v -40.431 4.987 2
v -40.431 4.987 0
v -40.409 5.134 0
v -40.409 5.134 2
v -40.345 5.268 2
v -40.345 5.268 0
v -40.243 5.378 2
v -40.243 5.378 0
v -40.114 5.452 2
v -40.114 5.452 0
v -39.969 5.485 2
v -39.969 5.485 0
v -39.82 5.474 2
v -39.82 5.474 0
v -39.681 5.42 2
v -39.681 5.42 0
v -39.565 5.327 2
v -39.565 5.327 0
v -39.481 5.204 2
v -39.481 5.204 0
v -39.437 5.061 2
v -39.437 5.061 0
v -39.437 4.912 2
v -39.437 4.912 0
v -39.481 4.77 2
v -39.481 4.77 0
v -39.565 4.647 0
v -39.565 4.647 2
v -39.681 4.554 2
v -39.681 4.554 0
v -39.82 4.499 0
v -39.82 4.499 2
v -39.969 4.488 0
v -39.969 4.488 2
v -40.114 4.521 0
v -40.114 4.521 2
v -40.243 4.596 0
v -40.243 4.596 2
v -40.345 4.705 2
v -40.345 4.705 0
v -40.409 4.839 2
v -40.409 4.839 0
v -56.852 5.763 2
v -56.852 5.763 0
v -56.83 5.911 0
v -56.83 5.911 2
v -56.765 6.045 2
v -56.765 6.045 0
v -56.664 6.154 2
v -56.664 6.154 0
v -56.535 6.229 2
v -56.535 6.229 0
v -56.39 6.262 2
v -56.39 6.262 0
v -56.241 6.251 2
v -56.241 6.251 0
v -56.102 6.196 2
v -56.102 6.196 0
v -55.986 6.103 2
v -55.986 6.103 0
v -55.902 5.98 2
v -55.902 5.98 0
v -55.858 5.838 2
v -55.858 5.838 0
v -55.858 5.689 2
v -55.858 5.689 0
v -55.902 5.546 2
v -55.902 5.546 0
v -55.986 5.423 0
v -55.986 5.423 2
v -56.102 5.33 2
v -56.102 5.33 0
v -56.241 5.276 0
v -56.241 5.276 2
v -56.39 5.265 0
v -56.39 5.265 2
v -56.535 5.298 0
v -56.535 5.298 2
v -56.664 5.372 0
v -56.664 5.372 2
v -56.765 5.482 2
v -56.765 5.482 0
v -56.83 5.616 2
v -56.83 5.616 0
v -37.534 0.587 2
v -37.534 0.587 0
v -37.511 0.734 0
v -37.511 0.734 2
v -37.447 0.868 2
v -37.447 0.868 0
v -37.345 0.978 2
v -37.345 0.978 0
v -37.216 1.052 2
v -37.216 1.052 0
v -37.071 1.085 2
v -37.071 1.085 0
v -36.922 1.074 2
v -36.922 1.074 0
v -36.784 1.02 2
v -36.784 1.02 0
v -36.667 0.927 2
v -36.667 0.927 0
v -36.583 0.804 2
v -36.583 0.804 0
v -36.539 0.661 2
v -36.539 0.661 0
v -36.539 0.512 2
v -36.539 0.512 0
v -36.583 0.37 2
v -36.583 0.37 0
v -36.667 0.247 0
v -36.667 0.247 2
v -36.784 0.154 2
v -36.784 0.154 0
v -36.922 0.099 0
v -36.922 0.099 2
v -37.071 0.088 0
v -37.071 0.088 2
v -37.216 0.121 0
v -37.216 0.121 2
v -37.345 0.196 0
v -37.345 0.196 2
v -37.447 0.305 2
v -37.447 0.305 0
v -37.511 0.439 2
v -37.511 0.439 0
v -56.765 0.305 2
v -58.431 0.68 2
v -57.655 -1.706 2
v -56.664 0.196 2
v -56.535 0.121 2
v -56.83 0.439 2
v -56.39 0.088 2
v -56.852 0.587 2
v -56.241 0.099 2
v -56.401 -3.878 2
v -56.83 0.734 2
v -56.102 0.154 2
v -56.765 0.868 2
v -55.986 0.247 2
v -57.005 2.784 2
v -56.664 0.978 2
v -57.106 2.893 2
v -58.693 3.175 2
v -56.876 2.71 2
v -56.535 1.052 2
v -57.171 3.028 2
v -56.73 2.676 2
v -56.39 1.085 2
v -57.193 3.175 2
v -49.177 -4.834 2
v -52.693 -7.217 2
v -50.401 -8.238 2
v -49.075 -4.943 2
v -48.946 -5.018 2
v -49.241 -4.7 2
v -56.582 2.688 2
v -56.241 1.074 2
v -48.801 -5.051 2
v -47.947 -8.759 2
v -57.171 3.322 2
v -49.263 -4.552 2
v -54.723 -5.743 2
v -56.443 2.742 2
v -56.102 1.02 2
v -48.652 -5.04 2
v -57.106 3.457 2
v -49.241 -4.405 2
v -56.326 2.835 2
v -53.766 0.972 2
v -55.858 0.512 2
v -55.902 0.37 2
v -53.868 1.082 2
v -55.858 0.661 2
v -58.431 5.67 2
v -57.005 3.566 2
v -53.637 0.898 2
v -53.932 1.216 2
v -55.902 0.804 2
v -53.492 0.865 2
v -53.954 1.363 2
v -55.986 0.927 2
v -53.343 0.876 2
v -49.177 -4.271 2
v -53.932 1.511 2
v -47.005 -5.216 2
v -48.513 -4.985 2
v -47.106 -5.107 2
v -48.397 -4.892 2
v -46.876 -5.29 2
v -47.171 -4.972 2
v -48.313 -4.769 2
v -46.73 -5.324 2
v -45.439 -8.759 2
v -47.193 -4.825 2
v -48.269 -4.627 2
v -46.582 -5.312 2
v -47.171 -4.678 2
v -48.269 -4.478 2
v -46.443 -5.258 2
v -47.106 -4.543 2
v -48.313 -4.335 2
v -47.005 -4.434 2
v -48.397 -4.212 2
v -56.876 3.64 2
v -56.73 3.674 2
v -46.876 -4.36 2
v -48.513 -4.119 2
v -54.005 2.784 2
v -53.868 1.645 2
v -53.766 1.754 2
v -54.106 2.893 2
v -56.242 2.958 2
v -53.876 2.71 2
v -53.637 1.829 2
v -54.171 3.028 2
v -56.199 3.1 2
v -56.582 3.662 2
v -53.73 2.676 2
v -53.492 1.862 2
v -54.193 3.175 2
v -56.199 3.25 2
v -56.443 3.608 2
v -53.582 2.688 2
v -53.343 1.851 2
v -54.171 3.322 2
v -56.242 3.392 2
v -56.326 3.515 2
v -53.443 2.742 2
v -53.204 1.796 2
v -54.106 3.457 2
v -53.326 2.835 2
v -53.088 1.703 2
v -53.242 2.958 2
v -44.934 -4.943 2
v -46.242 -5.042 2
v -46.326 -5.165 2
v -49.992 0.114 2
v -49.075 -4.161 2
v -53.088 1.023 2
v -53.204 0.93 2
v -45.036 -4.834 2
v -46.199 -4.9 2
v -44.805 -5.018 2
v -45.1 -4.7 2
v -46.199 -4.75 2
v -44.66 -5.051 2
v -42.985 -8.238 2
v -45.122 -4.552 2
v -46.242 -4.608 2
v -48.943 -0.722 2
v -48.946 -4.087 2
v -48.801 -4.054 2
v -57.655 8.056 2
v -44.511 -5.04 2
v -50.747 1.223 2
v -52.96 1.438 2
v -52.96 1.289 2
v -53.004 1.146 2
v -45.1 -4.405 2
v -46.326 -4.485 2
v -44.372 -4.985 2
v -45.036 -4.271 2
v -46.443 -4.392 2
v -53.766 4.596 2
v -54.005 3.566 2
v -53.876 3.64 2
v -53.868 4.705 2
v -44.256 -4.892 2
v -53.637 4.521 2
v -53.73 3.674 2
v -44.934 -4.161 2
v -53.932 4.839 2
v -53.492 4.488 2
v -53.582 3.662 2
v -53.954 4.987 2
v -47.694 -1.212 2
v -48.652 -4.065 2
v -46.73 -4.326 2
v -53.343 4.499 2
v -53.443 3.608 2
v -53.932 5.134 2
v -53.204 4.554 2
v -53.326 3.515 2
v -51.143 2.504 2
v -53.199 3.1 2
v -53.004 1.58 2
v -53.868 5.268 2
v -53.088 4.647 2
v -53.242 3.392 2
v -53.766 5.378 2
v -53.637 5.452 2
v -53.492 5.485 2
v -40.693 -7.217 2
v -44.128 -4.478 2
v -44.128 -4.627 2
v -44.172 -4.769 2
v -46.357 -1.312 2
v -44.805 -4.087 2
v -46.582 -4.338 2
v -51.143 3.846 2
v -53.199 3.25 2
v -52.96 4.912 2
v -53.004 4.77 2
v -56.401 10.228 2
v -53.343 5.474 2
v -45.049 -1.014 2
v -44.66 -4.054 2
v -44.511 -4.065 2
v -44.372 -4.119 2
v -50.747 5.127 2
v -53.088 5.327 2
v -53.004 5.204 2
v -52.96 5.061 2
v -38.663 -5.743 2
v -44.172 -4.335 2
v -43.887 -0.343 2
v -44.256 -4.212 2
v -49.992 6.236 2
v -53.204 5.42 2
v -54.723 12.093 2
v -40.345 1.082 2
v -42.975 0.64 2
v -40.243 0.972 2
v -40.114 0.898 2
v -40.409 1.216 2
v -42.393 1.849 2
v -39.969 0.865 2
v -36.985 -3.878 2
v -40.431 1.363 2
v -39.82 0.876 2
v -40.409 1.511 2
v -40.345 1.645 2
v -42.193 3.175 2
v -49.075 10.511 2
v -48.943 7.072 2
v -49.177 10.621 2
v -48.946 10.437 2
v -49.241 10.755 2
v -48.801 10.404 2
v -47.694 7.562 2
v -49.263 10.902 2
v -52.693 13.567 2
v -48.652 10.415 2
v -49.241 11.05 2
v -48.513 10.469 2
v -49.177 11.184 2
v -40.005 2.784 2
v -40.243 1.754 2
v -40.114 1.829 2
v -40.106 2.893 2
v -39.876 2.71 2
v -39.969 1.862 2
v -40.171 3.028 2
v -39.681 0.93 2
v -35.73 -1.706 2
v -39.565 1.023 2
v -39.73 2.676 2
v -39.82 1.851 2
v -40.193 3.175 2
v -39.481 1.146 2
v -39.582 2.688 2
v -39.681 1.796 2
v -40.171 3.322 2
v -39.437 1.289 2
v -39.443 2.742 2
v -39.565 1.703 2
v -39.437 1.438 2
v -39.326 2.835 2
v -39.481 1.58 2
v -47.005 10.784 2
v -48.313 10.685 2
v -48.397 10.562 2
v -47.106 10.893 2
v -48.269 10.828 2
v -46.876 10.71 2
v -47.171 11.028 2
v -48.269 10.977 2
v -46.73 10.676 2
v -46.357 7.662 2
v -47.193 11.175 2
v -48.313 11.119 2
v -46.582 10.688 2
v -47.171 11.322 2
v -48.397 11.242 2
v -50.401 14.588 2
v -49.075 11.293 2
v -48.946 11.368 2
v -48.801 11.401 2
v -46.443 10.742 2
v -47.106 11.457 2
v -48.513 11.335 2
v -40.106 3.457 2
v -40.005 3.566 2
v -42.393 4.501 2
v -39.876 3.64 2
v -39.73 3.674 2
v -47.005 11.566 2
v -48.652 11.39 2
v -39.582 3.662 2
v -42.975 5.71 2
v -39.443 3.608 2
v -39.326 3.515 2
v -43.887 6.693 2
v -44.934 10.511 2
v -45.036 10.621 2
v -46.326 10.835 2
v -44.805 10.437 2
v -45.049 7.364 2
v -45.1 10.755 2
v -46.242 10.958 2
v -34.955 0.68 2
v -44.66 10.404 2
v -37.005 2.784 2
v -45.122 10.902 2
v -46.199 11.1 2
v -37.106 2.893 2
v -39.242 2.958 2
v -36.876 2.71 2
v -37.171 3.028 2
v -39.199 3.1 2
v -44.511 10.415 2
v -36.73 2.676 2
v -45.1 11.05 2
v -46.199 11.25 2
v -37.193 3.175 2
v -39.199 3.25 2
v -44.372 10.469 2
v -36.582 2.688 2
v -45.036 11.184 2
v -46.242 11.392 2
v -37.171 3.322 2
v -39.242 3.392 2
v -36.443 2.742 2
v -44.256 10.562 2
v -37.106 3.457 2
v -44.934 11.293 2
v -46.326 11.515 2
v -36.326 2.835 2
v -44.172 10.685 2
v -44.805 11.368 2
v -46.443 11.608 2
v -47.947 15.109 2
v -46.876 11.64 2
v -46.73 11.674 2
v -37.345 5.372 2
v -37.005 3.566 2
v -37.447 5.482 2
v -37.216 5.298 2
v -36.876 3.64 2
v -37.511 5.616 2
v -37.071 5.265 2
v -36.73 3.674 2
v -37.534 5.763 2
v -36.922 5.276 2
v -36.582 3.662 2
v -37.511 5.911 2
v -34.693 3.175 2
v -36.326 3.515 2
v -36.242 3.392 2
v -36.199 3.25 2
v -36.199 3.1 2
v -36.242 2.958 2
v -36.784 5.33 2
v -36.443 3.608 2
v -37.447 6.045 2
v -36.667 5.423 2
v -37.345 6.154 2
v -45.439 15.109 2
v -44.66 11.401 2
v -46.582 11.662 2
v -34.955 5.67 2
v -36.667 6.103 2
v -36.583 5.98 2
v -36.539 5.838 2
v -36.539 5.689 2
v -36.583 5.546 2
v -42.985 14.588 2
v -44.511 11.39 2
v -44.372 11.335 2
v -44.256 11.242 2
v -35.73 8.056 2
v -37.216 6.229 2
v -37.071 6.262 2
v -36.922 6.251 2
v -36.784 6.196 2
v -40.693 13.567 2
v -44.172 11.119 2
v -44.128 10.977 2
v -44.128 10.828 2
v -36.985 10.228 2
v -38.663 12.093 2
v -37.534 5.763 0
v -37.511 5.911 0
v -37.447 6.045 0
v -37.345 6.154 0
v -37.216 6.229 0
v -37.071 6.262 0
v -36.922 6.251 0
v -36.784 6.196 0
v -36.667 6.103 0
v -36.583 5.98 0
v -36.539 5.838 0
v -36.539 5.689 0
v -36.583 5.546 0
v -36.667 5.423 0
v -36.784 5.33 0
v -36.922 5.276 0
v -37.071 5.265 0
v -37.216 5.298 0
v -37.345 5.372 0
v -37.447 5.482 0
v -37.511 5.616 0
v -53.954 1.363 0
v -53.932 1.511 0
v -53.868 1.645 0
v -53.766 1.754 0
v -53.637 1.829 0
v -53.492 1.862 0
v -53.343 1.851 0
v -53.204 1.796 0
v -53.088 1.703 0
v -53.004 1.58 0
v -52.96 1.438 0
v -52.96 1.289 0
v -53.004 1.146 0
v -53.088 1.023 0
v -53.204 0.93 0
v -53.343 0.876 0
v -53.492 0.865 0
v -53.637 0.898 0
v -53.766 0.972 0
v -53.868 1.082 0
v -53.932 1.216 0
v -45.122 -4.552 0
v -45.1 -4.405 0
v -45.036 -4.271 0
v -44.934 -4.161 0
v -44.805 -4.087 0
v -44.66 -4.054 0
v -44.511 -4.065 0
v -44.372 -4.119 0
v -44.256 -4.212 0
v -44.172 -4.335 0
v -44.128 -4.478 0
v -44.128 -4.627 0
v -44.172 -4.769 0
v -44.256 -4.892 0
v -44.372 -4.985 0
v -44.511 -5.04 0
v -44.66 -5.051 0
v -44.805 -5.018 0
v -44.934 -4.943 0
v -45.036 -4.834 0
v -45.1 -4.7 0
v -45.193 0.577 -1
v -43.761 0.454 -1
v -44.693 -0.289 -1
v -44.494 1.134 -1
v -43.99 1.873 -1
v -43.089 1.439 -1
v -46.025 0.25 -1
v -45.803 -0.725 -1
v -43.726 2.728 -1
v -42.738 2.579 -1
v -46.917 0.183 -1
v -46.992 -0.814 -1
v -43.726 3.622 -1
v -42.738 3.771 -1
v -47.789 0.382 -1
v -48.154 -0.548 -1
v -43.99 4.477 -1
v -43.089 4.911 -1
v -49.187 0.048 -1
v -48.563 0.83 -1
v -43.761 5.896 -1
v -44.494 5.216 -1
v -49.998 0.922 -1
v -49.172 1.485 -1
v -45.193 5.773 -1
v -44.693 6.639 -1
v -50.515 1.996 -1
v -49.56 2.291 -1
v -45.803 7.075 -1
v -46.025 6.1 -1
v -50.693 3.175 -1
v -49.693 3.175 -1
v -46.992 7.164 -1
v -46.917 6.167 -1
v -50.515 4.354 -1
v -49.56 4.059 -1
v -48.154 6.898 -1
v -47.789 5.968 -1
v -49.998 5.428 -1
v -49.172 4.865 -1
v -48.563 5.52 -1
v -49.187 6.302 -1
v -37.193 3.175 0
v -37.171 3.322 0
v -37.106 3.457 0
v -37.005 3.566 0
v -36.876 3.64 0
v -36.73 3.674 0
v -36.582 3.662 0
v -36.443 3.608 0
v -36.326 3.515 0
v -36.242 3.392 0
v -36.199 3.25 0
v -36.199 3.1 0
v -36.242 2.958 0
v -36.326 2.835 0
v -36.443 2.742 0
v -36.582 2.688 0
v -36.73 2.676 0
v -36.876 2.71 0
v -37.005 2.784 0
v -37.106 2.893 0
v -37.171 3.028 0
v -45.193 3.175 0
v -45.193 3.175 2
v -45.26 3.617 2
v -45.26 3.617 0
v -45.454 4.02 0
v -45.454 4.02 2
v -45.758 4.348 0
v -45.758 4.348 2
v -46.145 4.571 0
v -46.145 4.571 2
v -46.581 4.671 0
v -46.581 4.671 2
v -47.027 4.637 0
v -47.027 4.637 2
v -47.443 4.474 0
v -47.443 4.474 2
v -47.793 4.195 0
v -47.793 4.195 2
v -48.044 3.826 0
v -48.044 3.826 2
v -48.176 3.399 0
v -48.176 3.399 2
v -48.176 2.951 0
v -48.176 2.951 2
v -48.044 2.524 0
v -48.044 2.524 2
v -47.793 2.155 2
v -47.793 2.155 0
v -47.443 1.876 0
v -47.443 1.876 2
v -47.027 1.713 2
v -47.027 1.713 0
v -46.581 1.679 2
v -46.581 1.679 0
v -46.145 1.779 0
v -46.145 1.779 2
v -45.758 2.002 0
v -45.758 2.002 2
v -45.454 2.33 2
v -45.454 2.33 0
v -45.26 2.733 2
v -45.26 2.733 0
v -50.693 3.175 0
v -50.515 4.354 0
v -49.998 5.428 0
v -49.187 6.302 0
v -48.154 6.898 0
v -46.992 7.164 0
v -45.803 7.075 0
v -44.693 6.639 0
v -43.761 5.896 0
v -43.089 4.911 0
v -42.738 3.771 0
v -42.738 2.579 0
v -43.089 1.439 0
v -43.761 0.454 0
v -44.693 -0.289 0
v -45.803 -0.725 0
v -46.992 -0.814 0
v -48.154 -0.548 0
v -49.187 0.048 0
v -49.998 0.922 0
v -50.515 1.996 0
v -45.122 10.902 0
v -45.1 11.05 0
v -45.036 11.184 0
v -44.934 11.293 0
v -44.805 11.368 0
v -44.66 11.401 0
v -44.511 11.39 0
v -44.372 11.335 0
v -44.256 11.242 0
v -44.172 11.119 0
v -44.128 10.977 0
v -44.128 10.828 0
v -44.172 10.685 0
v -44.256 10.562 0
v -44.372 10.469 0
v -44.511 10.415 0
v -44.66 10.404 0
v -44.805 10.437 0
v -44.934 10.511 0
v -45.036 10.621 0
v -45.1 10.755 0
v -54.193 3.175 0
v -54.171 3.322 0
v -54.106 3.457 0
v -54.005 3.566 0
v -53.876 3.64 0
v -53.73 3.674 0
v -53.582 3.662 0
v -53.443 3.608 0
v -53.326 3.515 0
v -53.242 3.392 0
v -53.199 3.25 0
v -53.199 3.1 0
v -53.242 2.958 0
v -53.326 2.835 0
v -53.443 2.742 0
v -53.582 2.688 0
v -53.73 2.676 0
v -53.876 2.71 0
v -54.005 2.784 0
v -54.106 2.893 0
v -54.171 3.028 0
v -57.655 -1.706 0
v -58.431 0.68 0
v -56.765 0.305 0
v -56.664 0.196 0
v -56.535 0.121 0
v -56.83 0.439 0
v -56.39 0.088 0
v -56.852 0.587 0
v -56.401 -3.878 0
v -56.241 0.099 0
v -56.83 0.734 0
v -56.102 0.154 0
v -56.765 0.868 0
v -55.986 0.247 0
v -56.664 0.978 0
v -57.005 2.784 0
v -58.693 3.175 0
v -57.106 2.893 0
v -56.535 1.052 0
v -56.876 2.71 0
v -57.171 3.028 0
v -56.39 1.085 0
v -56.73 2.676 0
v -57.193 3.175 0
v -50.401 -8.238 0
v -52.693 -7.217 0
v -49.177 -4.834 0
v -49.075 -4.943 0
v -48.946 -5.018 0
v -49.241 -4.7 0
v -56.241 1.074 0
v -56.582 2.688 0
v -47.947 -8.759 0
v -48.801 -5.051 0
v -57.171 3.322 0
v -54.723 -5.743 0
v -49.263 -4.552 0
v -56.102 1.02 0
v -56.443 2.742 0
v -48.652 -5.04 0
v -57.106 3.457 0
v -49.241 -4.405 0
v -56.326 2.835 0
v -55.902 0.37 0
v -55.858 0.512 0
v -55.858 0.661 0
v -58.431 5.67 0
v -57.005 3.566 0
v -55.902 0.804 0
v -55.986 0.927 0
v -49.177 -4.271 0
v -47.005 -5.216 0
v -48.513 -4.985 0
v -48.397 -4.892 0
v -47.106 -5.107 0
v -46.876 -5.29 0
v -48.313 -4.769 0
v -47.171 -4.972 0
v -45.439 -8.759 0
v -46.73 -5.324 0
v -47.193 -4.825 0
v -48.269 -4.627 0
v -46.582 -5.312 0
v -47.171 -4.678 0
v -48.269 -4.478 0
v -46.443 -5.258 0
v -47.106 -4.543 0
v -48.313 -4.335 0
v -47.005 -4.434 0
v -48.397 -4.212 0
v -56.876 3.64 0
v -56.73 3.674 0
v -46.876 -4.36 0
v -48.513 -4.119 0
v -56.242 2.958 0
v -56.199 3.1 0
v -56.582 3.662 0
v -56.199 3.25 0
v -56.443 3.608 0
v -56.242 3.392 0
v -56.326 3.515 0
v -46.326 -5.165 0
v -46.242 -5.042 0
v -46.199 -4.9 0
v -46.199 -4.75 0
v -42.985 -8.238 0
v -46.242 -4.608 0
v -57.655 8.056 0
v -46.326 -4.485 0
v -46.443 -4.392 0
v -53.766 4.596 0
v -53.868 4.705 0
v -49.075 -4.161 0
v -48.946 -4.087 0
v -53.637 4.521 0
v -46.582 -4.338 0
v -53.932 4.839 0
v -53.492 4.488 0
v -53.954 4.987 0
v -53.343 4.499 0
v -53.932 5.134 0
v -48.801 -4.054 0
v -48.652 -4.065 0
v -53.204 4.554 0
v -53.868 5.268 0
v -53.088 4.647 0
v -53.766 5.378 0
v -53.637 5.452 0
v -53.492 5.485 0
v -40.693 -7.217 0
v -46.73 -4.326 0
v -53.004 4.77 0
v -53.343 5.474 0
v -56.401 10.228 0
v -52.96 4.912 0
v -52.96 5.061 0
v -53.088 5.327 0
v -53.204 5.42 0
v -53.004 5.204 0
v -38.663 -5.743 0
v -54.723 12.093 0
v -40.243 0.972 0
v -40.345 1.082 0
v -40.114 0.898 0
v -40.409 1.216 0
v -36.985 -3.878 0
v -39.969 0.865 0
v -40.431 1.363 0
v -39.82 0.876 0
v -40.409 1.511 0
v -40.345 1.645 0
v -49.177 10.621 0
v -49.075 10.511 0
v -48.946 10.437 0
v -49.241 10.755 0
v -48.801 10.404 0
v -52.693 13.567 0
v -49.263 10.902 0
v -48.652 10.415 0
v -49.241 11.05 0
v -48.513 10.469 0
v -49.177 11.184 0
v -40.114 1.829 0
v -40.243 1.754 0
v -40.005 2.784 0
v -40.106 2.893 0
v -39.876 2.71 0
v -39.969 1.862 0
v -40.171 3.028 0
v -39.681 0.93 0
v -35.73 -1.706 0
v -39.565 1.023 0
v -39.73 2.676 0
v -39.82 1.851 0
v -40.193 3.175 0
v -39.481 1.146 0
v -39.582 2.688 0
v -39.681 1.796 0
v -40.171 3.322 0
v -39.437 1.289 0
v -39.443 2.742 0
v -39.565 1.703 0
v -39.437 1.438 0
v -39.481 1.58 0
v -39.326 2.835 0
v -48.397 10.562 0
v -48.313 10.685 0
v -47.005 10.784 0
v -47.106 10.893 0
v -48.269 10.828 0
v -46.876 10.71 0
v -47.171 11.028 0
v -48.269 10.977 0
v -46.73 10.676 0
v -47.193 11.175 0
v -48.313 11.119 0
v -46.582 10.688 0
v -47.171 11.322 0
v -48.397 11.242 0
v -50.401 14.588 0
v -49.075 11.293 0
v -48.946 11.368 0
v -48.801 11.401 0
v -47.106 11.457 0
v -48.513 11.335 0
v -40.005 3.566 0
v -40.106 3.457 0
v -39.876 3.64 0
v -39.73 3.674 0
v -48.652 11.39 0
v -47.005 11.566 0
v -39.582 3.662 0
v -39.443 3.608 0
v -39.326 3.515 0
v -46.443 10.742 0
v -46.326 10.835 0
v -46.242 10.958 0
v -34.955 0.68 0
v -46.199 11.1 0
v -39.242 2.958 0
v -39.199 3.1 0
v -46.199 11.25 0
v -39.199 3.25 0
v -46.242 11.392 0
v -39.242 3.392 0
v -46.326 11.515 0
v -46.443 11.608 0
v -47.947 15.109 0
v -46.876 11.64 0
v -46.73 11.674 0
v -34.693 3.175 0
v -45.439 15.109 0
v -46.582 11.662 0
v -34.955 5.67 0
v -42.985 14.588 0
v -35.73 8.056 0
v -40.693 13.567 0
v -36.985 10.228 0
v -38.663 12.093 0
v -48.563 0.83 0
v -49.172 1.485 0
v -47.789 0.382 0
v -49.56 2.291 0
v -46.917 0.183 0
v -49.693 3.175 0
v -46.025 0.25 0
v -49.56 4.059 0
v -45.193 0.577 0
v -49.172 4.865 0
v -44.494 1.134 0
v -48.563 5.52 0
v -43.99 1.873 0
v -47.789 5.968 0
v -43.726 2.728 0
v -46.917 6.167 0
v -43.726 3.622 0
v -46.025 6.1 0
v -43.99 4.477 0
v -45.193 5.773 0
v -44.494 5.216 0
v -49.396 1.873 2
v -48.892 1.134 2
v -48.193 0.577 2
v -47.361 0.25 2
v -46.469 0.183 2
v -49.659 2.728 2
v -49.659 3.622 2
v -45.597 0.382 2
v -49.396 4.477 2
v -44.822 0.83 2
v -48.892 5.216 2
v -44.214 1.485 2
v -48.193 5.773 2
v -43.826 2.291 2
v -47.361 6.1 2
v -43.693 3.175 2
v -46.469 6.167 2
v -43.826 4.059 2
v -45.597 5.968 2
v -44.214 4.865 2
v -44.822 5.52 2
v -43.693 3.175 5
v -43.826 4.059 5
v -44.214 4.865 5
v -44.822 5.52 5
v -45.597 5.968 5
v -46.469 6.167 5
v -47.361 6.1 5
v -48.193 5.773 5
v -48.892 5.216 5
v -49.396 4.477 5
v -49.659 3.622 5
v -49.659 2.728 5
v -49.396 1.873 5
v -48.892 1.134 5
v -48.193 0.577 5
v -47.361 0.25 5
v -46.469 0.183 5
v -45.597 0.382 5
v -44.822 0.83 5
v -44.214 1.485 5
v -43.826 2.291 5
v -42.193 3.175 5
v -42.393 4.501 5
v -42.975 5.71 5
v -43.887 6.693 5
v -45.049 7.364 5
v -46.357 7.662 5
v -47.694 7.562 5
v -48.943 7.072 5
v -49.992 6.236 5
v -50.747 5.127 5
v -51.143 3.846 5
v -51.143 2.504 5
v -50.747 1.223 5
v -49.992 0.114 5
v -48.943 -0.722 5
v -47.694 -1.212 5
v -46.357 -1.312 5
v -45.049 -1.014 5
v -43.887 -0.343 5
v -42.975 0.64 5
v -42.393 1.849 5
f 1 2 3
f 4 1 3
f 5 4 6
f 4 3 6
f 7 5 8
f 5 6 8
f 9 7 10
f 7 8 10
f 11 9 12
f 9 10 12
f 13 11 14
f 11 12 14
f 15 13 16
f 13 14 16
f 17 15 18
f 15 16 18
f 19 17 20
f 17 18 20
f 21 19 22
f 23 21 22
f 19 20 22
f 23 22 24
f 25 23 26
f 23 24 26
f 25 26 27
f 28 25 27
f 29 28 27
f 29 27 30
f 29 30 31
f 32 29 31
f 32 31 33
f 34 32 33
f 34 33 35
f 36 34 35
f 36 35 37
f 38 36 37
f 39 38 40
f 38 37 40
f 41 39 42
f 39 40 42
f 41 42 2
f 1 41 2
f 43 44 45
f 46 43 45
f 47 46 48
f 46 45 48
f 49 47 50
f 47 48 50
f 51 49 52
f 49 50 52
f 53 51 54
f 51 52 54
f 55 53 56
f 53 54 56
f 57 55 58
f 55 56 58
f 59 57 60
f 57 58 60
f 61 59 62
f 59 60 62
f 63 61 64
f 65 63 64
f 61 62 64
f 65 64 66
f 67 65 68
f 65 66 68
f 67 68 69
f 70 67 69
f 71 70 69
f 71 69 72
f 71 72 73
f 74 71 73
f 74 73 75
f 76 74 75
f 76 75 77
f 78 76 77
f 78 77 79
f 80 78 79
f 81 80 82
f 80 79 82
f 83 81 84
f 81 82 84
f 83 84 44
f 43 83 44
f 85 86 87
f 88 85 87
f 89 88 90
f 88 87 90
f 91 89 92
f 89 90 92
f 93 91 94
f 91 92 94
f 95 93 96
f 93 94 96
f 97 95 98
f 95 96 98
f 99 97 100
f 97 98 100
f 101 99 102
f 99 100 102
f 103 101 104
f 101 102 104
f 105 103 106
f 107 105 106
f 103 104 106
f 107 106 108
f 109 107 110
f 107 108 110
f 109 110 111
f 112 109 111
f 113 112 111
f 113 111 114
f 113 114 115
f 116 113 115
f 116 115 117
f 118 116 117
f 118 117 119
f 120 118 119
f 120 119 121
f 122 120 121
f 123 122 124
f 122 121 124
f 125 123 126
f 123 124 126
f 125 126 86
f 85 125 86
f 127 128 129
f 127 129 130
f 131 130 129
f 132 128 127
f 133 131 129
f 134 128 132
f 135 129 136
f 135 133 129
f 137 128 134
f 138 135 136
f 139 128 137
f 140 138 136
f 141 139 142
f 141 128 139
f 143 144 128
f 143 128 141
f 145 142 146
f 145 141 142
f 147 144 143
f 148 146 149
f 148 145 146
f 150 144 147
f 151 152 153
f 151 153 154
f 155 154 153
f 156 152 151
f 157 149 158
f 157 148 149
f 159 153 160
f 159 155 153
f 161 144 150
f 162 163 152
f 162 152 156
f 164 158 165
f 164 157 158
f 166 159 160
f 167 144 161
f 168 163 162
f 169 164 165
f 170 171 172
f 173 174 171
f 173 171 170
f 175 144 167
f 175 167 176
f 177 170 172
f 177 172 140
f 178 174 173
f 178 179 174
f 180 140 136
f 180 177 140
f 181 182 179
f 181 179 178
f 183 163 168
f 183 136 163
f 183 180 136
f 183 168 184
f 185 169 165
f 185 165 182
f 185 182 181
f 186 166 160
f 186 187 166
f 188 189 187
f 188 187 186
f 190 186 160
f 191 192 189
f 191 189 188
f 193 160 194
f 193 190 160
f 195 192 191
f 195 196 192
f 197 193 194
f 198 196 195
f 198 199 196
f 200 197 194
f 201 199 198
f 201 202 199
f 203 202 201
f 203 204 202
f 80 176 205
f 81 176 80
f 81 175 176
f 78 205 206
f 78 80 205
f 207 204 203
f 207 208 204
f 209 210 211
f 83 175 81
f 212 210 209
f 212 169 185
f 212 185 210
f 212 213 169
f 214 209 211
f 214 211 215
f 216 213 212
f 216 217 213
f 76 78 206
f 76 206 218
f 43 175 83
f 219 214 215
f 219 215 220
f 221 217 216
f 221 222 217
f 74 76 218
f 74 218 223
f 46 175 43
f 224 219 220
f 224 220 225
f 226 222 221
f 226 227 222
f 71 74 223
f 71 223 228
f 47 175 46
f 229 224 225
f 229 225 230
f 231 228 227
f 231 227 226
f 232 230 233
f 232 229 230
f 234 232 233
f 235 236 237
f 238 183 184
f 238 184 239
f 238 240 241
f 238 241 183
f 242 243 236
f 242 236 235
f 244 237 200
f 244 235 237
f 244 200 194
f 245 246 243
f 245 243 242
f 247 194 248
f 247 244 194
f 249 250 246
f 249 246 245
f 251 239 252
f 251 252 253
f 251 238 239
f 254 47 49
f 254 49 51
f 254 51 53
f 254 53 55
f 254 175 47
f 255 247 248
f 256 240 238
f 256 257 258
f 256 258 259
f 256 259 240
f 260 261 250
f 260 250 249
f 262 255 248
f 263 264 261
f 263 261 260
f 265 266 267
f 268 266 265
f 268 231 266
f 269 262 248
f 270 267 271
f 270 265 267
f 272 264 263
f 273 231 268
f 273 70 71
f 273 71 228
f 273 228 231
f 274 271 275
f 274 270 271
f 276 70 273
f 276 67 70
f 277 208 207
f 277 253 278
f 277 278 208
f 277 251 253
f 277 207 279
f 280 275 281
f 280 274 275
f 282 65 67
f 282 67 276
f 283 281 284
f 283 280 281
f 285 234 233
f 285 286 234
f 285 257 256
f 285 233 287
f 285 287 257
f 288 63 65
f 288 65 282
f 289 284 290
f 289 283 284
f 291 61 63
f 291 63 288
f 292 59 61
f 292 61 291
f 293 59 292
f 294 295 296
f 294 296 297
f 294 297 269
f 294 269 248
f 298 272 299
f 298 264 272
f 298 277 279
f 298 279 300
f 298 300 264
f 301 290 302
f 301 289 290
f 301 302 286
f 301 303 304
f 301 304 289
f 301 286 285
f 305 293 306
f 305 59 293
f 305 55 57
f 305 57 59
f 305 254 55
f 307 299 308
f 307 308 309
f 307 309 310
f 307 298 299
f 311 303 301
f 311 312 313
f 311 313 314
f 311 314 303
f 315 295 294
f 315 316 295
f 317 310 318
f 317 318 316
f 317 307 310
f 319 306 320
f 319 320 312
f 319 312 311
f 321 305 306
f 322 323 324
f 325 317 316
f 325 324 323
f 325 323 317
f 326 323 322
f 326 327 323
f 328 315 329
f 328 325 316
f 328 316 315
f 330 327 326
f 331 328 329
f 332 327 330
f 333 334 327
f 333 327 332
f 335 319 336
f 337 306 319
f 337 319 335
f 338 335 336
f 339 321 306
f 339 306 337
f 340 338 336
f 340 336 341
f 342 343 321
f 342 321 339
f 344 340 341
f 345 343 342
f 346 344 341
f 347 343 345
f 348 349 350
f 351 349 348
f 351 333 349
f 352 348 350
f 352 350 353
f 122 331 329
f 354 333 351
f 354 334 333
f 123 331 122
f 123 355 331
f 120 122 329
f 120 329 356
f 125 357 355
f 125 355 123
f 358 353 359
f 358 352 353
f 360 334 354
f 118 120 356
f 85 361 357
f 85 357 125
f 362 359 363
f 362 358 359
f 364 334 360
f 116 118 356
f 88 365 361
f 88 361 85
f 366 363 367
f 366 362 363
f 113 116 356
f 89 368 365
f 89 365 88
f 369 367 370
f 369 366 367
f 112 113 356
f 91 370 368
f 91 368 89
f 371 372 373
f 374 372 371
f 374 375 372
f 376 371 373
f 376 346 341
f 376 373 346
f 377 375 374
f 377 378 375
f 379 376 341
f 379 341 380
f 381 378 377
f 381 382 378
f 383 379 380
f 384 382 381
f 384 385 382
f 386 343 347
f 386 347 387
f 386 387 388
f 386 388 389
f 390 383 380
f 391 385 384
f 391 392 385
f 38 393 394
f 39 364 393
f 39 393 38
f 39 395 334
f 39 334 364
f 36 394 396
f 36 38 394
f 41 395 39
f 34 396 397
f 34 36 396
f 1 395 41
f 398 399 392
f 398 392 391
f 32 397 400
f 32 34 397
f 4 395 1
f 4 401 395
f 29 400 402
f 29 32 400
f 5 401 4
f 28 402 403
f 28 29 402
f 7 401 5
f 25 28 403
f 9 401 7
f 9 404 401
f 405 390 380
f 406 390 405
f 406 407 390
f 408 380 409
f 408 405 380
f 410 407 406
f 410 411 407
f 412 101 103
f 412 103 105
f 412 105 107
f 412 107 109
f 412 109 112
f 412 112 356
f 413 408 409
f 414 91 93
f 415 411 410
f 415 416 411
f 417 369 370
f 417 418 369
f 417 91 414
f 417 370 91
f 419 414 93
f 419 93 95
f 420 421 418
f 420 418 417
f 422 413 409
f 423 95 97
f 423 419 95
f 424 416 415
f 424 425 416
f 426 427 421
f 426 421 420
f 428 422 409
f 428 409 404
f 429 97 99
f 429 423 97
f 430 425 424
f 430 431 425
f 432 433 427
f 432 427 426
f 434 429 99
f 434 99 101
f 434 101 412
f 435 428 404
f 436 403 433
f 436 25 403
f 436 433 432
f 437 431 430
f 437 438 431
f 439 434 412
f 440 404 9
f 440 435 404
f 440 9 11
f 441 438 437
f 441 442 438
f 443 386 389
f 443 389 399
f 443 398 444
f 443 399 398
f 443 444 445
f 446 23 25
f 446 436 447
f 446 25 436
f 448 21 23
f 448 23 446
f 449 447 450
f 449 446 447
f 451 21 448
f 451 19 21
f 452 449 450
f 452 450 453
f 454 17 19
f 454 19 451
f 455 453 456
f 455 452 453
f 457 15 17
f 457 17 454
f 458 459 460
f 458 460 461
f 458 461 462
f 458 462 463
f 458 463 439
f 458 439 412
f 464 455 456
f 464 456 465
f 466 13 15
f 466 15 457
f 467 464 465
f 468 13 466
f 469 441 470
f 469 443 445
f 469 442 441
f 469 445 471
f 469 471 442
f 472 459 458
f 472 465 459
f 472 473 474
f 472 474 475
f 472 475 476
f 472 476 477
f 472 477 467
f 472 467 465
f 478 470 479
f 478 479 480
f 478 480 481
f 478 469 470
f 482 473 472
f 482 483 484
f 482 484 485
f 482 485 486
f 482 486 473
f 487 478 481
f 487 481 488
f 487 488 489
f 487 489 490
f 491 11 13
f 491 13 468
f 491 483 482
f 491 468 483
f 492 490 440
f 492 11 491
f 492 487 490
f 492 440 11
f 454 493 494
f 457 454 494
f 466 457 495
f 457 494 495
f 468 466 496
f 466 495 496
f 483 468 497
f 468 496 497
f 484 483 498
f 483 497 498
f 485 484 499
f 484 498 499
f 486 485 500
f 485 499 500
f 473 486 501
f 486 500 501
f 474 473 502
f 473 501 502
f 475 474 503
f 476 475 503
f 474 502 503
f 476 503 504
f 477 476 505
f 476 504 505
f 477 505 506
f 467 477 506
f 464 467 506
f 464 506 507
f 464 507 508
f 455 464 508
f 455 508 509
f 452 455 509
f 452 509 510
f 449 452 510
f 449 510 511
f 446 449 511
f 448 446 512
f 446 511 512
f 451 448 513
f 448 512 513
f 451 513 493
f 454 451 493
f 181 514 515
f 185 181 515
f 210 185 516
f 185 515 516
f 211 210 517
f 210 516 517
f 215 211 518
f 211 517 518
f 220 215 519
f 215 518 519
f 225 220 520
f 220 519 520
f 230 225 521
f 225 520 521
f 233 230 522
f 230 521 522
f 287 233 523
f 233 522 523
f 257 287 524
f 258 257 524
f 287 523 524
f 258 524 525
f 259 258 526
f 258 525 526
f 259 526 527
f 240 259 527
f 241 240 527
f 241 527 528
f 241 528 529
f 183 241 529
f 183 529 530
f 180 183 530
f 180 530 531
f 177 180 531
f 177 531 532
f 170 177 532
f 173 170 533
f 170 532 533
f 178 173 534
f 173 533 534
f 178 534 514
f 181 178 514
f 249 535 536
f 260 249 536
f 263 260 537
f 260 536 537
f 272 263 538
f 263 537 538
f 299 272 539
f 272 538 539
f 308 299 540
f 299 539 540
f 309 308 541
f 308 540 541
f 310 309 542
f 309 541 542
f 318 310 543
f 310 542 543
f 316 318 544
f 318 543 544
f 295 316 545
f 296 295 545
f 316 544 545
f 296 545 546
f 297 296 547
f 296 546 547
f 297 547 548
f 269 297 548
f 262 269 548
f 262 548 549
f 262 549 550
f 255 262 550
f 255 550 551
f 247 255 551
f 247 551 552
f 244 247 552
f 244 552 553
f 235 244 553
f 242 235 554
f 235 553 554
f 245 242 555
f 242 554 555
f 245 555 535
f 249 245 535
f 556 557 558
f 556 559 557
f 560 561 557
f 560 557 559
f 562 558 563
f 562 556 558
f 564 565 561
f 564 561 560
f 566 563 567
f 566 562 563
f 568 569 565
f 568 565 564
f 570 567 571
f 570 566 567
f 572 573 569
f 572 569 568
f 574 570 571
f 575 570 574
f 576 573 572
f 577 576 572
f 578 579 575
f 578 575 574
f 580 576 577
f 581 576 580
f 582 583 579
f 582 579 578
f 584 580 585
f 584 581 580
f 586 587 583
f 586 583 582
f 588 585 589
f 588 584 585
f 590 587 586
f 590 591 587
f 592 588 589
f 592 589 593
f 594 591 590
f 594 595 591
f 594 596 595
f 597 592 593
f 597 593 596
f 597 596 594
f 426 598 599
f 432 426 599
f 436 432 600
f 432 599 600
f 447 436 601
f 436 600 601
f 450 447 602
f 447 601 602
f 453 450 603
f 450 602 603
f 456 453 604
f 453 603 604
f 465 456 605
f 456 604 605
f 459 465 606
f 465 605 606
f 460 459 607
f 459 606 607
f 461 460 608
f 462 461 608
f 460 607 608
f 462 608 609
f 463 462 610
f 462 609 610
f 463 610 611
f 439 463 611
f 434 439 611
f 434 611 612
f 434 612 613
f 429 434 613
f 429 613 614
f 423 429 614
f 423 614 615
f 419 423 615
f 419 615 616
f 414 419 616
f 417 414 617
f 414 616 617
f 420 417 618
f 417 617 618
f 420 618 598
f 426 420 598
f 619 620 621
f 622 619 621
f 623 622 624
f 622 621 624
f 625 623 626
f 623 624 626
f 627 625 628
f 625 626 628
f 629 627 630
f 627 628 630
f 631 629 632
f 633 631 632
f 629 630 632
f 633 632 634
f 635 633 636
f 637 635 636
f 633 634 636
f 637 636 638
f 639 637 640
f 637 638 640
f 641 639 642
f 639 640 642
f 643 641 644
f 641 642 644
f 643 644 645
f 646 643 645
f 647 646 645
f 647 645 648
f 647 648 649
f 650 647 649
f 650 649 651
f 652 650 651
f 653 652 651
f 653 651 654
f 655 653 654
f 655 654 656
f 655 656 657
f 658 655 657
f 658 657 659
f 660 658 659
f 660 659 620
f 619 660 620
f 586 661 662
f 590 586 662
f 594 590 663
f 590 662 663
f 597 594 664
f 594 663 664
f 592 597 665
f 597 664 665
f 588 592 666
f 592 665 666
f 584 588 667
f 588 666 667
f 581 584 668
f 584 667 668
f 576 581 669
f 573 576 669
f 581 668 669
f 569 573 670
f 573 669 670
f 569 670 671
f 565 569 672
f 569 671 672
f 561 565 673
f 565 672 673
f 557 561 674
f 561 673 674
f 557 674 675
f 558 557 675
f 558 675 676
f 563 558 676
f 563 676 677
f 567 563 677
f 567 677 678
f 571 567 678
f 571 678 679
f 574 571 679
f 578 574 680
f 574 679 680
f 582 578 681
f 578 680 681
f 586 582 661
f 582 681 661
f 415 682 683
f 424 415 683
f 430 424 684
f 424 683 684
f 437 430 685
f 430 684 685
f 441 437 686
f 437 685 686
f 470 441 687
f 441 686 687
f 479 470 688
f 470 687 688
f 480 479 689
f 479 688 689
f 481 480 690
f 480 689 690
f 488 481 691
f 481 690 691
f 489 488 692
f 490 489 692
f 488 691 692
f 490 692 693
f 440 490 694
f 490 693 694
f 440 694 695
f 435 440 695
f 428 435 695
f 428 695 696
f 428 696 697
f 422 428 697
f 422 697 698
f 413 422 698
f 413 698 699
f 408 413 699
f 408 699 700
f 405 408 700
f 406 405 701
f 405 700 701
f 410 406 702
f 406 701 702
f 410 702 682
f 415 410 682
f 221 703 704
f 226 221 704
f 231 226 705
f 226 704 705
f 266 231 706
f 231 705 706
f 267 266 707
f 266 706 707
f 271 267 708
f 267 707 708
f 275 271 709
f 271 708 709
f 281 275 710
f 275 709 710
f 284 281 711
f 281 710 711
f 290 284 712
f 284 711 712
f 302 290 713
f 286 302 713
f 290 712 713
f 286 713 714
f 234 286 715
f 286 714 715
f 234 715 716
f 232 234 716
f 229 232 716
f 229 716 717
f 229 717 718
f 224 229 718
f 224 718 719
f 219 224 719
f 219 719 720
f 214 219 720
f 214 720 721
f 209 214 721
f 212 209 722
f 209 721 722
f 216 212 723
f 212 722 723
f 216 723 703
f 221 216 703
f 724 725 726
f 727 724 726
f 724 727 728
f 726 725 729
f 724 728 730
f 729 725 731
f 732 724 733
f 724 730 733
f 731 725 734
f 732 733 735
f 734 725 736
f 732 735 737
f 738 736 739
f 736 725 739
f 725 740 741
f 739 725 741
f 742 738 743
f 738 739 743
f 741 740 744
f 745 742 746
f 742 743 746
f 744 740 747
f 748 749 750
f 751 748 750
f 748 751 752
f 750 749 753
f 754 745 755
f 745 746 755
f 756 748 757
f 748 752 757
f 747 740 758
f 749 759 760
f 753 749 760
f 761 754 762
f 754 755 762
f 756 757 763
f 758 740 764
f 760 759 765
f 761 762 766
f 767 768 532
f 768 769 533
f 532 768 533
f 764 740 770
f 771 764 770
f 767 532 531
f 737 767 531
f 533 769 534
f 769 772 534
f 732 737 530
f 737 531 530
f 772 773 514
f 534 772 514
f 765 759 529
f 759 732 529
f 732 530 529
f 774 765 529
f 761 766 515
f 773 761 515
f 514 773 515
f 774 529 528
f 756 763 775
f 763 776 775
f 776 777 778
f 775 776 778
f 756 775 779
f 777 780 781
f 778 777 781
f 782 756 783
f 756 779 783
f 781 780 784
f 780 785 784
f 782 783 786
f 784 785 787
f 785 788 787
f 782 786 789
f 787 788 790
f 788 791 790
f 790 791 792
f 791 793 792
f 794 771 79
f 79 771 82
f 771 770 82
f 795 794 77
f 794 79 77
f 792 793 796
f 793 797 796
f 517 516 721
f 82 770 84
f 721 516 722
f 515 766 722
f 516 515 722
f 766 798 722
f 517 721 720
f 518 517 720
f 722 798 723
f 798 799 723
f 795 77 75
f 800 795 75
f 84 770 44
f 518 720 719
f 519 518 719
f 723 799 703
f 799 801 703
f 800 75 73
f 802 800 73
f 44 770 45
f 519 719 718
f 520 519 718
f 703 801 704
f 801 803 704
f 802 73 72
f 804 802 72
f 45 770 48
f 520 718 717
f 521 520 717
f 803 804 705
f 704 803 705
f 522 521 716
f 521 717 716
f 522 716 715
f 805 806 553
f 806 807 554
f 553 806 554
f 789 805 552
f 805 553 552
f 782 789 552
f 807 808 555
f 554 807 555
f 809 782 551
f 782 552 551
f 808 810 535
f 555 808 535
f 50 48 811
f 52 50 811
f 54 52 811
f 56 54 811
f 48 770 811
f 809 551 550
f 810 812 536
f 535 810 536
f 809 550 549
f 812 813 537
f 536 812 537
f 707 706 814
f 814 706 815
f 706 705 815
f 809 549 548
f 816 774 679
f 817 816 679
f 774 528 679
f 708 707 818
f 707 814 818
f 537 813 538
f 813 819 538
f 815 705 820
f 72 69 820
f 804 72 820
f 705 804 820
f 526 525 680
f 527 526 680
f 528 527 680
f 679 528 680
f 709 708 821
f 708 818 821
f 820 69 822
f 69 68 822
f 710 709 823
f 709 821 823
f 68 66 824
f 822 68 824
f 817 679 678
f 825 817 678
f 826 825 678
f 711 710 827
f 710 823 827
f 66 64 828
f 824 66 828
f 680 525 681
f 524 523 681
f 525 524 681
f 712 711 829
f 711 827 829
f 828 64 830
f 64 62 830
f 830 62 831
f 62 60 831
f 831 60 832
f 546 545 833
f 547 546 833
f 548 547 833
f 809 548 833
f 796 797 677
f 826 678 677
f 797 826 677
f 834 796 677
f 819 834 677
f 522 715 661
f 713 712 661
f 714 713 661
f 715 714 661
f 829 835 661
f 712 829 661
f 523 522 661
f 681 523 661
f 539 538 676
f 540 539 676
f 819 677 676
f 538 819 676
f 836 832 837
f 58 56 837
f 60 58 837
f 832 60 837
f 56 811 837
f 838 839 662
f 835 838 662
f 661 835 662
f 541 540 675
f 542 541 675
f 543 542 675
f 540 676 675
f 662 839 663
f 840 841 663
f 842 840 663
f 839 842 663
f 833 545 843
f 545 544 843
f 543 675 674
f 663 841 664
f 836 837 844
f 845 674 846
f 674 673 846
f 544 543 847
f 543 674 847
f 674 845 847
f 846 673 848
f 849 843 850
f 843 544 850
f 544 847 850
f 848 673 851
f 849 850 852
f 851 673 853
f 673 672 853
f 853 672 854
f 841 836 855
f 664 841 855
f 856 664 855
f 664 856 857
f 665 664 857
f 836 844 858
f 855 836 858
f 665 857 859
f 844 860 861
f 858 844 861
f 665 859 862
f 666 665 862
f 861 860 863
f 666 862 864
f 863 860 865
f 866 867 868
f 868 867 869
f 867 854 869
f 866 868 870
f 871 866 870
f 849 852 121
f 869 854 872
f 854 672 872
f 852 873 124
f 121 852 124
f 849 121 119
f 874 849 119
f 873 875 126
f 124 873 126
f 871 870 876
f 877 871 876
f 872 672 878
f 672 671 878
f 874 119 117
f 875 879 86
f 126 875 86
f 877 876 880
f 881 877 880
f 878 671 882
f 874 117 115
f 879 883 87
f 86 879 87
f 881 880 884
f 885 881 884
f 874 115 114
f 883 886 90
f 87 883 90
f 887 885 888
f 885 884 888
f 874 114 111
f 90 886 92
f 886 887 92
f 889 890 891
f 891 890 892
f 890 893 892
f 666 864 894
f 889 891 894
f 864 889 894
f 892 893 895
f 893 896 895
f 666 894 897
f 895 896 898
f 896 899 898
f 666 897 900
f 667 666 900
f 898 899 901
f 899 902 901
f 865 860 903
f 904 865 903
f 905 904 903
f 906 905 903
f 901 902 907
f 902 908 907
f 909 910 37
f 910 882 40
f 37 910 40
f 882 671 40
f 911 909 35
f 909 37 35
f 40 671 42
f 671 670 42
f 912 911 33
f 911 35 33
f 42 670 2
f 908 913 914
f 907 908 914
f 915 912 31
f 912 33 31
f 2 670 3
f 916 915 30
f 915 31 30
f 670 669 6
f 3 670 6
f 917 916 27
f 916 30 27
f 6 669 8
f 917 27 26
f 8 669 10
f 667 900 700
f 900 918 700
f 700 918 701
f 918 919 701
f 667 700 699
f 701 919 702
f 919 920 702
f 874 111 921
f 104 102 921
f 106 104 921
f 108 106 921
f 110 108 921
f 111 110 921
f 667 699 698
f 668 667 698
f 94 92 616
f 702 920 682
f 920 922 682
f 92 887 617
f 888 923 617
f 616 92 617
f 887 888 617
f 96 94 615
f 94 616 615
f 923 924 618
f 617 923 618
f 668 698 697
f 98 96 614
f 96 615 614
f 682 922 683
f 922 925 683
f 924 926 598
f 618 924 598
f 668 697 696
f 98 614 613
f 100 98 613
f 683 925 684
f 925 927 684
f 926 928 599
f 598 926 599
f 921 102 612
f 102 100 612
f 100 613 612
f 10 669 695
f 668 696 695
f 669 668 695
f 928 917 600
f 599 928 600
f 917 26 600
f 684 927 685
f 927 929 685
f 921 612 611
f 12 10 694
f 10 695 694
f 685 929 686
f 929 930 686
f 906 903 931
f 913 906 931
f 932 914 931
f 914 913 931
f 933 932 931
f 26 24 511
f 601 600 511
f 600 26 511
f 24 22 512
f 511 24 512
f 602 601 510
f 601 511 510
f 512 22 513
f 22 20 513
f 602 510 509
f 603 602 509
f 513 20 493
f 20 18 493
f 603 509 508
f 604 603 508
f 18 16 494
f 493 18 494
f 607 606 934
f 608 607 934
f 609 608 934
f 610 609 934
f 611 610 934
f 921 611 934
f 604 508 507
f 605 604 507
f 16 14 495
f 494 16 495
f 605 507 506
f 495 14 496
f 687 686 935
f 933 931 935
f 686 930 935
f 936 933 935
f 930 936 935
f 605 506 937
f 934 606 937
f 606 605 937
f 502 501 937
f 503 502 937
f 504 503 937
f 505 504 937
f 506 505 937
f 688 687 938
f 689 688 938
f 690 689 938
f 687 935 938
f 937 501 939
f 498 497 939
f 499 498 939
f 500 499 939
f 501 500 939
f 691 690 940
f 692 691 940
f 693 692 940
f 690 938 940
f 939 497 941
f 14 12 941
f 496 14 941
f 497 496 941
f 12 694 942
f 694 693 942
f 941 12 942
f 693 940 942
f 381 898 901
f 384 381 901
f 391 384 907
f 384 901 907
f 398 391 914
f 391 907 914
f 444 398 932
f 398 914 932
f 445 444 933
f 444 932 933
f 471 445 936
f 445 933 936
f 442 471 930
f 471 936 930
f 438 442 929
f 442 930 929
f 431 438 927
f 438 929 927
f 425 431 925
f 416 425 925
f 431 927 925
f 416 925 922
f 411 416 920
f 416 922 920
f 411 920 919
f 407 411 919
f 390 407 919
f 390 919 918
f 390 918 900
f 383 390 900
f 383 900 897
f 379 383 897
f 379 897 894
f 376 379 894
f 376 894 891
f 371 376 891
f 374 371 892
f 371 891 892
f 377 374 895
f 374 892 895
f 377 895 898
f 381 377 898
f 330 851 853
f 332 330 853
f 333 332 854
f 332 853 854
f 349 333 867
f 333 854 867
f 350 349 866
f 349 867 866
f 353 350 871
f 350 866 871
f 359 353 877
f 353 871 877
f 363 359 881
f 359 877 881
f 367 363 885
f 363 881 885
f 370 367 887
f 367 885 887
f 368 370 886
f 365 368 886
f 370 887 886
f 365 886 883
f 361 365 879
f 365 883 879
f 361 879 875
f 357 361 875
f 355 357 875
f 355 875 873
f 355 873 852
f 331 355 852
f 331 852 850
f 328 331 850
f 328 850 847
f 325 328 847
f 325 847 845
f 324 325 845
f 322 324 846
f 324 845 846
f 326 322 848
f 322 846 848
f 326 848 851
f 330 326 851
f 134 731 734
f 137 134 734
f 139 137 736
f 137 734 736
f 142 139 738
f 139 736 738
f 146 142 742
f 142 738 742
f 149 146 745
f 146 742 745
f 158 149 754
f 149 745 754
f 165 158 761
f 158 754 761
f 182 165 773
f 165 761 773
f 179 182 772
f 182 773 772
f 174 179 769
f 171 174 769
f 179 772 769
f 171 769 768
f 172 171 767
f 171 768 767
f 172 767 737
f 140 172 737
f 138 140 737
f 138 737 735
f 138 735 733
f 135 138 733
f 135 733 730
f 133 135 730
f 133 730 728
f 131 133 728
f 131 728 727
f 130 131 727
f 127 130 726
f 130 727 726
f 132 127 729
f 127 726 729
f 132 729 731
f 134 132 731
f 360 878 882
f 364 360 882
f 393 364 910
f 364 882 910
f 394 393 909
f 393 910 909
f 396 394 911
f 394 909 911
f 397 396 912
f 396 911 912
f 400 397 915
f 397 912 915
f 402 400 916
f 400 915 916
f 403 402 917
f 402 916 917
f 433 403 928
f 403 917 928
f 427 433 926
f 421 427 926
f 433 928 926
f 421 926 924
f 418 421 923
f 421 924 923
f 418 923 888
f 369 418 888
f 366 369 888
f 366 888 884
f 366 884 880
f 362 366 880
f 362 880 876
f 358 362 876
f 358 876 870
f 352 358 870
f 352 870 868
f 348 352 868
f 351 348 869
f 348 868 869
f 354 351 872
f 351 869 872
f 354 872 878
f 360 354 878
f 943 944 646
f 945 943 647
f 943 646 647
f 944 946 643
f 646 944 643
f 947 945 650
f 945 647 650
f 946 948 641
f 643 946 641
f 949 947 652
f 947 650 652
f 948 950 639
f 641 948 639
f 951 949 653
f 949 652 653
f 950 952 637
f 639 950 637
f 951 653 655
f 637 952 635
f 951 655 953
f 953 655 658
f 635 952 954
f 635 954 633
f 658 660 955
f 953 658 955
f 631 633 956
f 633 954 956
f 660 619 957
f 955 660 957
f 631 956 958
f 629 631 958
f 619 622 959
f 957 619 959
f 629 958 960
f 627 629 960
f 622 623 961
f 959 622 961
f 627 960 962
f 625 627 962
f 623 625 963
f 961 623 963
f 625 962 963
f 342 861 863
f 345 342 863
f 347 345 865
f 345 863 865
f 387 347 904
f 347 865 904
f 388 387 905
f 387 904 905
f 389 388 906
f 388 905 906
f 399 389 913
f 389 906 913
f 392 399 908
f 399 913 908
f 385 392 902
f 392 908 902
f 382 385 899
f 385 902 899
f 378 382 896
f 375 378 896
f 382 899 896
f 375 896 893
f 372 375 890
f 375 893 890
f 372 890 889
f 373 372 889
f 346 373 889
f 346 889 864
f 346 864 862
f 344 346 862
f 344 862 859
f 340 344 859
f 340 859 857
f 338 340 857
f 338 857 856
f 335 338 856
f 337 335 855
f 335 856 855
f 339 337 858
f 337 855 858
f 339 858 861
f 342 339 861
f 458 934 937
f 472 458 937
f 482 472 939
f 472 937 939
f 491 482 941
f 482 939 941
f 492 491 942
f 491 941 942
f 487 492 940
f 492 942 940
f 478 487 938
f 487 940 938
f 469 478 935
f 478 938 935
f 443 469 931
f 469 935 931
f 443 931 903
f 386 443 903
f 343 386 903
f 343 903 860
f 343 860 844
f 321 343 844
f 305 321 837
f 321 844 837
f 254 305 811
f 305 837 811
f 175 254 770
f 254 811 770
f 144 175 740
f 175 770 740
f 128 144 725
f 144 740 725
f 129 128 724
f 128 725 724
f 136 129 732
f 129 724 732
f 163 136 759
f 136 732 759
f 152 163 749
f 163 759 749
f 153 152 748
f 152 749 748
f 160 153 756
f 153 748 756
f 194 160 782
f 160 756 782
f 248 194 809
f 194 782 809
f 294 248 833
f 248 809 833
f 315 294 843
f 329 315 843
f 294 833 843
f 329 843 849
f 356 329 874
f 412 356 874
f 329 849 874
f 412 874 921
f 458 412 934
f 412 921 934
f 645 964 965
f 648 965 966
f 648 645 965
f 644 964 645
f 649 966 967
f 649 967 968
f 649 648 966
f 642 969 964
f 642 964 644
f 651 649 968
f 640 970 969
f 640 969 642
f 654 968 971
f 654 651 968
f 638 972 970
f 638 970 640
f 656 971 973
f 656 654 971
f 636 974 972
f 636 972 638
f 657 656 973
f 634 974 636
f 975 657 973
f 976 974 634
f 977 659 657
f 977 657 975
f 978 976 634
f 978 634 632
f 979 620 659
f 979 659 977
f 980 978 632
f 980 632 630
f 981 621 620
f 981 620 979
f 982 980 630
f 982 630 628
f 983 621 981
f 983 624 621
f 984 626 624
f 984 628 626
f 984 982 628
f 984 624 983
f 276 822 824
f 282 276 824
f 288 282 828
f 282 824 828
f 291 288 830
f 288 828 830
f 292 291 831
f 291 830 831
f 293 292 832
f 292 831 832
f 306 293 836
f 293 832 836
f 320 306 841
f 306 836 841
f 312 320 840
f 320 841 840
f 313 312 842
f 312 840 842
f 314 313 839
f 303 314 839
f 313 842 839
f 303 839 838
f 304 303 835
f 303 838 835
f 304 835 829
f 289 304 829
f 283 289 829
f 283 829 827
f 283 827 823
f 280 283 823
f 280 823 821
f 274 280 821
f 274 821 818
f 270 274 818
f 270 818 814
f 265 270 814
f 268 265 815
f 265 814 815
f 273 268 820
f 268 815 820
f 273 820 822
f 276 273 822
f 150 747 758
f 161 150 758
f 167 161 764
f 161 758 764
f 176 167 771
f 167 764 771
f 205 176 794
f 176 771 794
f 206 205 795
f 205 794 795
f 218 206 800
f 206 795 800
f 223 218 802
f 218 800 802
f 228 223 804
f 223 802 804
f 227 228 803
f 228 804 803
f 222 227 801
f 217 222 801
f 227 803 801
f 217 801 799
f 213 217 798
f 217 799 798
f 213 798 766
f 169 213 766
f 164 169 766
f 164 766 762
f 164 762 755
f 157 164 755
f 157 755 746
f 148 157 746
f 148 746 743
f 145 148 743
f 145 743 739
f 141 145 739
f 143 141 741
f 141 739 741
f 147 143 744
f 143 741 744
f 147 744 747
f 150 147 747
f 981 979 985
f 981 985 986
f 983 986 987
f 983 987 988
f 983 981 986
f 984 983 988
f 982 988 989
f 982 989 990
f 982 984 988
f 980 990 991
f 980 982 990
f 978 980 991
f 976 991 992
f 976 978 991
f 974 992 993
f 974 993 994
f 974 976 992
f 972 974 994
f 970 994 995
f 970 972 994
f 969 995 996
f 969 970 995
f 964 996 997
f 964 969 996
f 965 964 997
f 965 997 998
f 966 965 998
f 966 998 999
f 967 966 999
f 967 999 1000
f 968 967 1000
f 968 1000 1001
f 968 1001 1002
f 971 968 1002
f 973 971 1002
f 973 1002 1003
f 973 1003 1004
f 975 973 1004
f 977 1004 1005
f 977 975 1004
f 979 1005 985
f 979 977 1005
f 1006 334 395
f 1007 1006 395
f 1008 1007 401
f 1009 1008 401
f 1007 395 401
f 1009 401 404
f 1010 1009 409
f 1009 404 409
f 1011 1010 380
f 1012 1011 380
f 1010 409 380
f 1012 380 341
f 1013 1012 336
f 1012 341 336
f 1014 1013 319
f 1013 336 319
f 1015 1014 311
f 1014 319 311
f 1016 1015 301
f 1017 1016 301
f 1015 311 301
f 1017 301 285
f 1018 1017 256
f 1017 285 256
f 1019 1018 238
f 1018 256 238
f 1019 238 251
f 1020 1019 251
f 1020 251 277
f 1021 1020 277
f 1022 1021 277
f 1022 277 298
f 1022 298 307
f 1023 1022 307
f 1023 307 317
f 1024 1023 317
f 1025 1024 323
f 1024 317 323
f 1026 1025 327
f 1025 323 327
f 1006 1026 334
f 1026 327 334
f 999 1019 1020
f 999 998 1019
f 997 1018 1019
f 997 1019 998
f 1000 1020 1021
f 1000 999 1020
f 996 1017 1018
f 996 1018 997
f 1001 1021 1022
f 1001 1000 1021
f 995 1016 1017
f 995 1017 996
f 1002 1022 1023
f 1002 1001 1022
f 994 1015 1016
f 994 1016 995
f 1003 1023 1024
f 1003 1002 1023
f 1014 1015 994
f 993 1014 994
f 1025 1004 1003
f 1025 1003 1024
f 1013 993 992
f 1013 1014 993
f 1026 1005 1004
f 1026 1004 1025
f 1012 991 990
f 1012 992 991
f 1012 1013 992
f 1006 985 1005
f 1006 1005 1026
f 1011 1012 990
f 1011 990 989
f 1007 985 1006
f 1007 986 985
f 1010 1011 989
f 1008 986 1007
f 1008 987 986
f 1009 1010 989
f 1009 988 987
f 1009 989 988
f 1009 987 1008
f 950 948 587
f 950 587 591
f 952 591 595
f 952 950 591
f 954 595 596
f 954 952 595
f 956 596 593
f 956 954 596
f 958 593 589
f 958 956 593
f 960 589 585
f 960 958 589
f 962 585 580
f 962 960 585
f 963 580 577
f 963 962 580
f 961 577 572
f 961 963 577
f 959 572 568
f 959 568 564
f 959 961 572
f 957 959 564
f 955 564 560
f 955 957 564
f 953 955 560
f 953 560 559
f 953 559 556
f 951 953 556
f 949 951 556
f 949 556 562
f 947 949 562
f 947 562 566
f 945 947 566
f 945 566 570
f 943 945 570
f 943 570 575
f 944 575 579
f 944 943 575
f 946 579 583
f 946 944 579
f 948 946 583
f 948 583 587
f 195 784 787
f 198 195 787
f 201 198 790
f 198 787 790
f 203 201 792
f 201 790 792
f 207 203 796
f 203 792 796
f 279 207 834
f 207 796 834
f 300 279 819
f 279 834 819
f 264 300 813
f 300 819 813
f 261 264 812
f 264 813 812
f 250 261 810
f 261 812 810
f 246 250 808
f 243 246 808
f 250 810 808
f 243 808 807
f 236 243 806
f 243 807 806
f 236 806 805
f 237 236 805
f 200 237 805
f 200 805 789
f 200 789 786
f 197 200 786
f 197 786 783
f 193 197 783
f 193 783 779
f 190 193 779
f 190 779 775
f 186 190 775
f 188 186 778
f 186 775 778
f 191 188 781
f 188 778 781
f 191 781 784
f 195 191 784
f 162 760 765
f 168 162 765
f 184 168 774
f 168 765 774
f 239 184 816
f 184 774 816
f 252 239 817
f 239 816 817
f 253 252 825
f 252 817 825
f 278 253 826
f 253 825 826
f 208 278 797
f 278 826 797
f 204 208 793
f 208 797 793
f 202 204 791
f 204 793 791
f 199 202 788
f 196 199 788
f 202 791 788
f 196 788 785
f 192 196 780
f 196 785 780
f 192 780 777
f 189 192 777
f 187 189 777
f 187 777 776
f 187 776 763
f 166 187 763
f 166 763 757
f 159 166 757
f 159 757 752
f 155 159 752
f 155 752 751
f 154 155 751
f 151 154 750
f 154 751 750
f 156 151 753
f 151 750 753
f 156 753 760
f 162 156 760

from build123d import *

# Parameters (mm, degrees)
SKETCH1_R           = 12
BOSS_EXTRUDE1_DEPTH = 2
SKETCH2_R           = 4.5
SKETCH2_R_2         = 3
BOSS_EXTRUDE2_DEPTH = 3
SKETCH3_R           = 1.5
CUT_EXTRUDE1_DEPTH  = 3
SKETCH4_R           = 4
SKETCH4_R_2         = 3
BOSS_EXTRUDE3_DEPTH = 1
SKETCH5_R           = 0.5
CUT_EXTRUDE2_DEPTH  = 2


with BuildPart() as part:
    # Sketch1 → Boss-Extrude1 (new body)
    with BuildSketch(Plane.XY):
        with Locations((-46.692941858, 3.175)):
            Circle(SKETCH1_R)
    extrude(amount=BOSS_EXTRUDE1_DEPTH)

    # Sketch2 → Boss-Extrude2 (add)
    with BuildSketch(Plane.XY.offset(2)):
        with Locations((-46.692941858, 3.175)):
            Circle(SKETCH2_R)
        with Locations((-46.692941858, 3.175)):
            Circle(SKETCH2_R_2, mode=Mode.SUBTRACT)
    extrude(amount=BOSS_EXTRUDE2_DEPTH)

    # Sketch3 → Cut-Extrude1 (cut)
    with BuildSketch(Plane.XY.offset(2)):
        with Locations((-46.692941858, 3.175)):
            Circle(SKETCH3_R)
    extrude(amount=-CUT_EXTRUDE1_DEPTH, mode=Mode.SUBTRACT)

    # Sketch4 → Boss-Extrude3 (add)
    with BuildSketch(Plane(origin=(0, 0, 0), x_dir=(-1, 0, 0), z_dir=(0, 0, -1))):
        with Locations((46.692941858, 3.175)):
            Circle(SKETCH4_R)
        with Locations((46.692941858, 3.175)):
            Circle(SKETCH4_R_2, mode=Mode.SUBTRACT)
    extrude(amount=BOSS_EXTRUDE3_DEPTH)

    # Sketch5 → Cut-Extrude2 (cut)
    with BuildSketch(Plane(origin=(0, 0, 0), x_dir=(-1, 0, 0), z_dir=(0, 0, -1))):
        with Locations((46.692941858, -4.825)):
            Circle(SKETCH5_R)
        with Locations((39.692941858, 3.175)):
            Circle(SKETCH5_R)
        with Locations((36.692941858, 3.175)):
            Circle(SKETCH5_R)
        with Locations((53.692941858, 3.175)):
            Circle(SKETCH5_R)
        with Locations((56.692941858, 3.175)):
            Circle(SKETCH5_R)
        with Locations((39.931461074, 1.363266684)):
            Circle(SKETCH5_R)
        with Locations((37.033683596, 0.586809549)):
            Circle(SKETCH5_R)
        with Locations((39.931461074, 4.986733316)):
            Circle(SKETCH5_R)
        with Locations((37.033683596, 5.763190451)):
            Circle(SKETCH5_R)
        with Locations((53.454422642, 4.986733316)):
            Circle(SKETCH5_R)
        with Locations((56.352200121, 5.763190451)):
            Circle(SKETCH5_R)
        with Locations((53.454422642, 1.363266684)):
            Circle(SKETCH5_R)
        with Locations((56.352200121, 0.586809549)):
            Circle(SKETCH5_R)
        with Locations((46.692941858, 11.175)):
            Circle(SKETCH5_R)
        with Locations((44.622389498, -4.55240661)):
            Circle(SKETCH5_R)
        with Locations((48.763494219, 10.90240661)):
            Circle(SKETCH5_R)
        with Locations((48.763494219, -4.55240661)):
            Circle(SKETCH5_R)
        with Locations((44.622389498, 10.90240661)):
            Circle(SKETCH5_R)
    extrude(amount=-CUT_EXTRUDE2_DEPTH, mode=Mode.SUBTRACT)


solid = part.part
